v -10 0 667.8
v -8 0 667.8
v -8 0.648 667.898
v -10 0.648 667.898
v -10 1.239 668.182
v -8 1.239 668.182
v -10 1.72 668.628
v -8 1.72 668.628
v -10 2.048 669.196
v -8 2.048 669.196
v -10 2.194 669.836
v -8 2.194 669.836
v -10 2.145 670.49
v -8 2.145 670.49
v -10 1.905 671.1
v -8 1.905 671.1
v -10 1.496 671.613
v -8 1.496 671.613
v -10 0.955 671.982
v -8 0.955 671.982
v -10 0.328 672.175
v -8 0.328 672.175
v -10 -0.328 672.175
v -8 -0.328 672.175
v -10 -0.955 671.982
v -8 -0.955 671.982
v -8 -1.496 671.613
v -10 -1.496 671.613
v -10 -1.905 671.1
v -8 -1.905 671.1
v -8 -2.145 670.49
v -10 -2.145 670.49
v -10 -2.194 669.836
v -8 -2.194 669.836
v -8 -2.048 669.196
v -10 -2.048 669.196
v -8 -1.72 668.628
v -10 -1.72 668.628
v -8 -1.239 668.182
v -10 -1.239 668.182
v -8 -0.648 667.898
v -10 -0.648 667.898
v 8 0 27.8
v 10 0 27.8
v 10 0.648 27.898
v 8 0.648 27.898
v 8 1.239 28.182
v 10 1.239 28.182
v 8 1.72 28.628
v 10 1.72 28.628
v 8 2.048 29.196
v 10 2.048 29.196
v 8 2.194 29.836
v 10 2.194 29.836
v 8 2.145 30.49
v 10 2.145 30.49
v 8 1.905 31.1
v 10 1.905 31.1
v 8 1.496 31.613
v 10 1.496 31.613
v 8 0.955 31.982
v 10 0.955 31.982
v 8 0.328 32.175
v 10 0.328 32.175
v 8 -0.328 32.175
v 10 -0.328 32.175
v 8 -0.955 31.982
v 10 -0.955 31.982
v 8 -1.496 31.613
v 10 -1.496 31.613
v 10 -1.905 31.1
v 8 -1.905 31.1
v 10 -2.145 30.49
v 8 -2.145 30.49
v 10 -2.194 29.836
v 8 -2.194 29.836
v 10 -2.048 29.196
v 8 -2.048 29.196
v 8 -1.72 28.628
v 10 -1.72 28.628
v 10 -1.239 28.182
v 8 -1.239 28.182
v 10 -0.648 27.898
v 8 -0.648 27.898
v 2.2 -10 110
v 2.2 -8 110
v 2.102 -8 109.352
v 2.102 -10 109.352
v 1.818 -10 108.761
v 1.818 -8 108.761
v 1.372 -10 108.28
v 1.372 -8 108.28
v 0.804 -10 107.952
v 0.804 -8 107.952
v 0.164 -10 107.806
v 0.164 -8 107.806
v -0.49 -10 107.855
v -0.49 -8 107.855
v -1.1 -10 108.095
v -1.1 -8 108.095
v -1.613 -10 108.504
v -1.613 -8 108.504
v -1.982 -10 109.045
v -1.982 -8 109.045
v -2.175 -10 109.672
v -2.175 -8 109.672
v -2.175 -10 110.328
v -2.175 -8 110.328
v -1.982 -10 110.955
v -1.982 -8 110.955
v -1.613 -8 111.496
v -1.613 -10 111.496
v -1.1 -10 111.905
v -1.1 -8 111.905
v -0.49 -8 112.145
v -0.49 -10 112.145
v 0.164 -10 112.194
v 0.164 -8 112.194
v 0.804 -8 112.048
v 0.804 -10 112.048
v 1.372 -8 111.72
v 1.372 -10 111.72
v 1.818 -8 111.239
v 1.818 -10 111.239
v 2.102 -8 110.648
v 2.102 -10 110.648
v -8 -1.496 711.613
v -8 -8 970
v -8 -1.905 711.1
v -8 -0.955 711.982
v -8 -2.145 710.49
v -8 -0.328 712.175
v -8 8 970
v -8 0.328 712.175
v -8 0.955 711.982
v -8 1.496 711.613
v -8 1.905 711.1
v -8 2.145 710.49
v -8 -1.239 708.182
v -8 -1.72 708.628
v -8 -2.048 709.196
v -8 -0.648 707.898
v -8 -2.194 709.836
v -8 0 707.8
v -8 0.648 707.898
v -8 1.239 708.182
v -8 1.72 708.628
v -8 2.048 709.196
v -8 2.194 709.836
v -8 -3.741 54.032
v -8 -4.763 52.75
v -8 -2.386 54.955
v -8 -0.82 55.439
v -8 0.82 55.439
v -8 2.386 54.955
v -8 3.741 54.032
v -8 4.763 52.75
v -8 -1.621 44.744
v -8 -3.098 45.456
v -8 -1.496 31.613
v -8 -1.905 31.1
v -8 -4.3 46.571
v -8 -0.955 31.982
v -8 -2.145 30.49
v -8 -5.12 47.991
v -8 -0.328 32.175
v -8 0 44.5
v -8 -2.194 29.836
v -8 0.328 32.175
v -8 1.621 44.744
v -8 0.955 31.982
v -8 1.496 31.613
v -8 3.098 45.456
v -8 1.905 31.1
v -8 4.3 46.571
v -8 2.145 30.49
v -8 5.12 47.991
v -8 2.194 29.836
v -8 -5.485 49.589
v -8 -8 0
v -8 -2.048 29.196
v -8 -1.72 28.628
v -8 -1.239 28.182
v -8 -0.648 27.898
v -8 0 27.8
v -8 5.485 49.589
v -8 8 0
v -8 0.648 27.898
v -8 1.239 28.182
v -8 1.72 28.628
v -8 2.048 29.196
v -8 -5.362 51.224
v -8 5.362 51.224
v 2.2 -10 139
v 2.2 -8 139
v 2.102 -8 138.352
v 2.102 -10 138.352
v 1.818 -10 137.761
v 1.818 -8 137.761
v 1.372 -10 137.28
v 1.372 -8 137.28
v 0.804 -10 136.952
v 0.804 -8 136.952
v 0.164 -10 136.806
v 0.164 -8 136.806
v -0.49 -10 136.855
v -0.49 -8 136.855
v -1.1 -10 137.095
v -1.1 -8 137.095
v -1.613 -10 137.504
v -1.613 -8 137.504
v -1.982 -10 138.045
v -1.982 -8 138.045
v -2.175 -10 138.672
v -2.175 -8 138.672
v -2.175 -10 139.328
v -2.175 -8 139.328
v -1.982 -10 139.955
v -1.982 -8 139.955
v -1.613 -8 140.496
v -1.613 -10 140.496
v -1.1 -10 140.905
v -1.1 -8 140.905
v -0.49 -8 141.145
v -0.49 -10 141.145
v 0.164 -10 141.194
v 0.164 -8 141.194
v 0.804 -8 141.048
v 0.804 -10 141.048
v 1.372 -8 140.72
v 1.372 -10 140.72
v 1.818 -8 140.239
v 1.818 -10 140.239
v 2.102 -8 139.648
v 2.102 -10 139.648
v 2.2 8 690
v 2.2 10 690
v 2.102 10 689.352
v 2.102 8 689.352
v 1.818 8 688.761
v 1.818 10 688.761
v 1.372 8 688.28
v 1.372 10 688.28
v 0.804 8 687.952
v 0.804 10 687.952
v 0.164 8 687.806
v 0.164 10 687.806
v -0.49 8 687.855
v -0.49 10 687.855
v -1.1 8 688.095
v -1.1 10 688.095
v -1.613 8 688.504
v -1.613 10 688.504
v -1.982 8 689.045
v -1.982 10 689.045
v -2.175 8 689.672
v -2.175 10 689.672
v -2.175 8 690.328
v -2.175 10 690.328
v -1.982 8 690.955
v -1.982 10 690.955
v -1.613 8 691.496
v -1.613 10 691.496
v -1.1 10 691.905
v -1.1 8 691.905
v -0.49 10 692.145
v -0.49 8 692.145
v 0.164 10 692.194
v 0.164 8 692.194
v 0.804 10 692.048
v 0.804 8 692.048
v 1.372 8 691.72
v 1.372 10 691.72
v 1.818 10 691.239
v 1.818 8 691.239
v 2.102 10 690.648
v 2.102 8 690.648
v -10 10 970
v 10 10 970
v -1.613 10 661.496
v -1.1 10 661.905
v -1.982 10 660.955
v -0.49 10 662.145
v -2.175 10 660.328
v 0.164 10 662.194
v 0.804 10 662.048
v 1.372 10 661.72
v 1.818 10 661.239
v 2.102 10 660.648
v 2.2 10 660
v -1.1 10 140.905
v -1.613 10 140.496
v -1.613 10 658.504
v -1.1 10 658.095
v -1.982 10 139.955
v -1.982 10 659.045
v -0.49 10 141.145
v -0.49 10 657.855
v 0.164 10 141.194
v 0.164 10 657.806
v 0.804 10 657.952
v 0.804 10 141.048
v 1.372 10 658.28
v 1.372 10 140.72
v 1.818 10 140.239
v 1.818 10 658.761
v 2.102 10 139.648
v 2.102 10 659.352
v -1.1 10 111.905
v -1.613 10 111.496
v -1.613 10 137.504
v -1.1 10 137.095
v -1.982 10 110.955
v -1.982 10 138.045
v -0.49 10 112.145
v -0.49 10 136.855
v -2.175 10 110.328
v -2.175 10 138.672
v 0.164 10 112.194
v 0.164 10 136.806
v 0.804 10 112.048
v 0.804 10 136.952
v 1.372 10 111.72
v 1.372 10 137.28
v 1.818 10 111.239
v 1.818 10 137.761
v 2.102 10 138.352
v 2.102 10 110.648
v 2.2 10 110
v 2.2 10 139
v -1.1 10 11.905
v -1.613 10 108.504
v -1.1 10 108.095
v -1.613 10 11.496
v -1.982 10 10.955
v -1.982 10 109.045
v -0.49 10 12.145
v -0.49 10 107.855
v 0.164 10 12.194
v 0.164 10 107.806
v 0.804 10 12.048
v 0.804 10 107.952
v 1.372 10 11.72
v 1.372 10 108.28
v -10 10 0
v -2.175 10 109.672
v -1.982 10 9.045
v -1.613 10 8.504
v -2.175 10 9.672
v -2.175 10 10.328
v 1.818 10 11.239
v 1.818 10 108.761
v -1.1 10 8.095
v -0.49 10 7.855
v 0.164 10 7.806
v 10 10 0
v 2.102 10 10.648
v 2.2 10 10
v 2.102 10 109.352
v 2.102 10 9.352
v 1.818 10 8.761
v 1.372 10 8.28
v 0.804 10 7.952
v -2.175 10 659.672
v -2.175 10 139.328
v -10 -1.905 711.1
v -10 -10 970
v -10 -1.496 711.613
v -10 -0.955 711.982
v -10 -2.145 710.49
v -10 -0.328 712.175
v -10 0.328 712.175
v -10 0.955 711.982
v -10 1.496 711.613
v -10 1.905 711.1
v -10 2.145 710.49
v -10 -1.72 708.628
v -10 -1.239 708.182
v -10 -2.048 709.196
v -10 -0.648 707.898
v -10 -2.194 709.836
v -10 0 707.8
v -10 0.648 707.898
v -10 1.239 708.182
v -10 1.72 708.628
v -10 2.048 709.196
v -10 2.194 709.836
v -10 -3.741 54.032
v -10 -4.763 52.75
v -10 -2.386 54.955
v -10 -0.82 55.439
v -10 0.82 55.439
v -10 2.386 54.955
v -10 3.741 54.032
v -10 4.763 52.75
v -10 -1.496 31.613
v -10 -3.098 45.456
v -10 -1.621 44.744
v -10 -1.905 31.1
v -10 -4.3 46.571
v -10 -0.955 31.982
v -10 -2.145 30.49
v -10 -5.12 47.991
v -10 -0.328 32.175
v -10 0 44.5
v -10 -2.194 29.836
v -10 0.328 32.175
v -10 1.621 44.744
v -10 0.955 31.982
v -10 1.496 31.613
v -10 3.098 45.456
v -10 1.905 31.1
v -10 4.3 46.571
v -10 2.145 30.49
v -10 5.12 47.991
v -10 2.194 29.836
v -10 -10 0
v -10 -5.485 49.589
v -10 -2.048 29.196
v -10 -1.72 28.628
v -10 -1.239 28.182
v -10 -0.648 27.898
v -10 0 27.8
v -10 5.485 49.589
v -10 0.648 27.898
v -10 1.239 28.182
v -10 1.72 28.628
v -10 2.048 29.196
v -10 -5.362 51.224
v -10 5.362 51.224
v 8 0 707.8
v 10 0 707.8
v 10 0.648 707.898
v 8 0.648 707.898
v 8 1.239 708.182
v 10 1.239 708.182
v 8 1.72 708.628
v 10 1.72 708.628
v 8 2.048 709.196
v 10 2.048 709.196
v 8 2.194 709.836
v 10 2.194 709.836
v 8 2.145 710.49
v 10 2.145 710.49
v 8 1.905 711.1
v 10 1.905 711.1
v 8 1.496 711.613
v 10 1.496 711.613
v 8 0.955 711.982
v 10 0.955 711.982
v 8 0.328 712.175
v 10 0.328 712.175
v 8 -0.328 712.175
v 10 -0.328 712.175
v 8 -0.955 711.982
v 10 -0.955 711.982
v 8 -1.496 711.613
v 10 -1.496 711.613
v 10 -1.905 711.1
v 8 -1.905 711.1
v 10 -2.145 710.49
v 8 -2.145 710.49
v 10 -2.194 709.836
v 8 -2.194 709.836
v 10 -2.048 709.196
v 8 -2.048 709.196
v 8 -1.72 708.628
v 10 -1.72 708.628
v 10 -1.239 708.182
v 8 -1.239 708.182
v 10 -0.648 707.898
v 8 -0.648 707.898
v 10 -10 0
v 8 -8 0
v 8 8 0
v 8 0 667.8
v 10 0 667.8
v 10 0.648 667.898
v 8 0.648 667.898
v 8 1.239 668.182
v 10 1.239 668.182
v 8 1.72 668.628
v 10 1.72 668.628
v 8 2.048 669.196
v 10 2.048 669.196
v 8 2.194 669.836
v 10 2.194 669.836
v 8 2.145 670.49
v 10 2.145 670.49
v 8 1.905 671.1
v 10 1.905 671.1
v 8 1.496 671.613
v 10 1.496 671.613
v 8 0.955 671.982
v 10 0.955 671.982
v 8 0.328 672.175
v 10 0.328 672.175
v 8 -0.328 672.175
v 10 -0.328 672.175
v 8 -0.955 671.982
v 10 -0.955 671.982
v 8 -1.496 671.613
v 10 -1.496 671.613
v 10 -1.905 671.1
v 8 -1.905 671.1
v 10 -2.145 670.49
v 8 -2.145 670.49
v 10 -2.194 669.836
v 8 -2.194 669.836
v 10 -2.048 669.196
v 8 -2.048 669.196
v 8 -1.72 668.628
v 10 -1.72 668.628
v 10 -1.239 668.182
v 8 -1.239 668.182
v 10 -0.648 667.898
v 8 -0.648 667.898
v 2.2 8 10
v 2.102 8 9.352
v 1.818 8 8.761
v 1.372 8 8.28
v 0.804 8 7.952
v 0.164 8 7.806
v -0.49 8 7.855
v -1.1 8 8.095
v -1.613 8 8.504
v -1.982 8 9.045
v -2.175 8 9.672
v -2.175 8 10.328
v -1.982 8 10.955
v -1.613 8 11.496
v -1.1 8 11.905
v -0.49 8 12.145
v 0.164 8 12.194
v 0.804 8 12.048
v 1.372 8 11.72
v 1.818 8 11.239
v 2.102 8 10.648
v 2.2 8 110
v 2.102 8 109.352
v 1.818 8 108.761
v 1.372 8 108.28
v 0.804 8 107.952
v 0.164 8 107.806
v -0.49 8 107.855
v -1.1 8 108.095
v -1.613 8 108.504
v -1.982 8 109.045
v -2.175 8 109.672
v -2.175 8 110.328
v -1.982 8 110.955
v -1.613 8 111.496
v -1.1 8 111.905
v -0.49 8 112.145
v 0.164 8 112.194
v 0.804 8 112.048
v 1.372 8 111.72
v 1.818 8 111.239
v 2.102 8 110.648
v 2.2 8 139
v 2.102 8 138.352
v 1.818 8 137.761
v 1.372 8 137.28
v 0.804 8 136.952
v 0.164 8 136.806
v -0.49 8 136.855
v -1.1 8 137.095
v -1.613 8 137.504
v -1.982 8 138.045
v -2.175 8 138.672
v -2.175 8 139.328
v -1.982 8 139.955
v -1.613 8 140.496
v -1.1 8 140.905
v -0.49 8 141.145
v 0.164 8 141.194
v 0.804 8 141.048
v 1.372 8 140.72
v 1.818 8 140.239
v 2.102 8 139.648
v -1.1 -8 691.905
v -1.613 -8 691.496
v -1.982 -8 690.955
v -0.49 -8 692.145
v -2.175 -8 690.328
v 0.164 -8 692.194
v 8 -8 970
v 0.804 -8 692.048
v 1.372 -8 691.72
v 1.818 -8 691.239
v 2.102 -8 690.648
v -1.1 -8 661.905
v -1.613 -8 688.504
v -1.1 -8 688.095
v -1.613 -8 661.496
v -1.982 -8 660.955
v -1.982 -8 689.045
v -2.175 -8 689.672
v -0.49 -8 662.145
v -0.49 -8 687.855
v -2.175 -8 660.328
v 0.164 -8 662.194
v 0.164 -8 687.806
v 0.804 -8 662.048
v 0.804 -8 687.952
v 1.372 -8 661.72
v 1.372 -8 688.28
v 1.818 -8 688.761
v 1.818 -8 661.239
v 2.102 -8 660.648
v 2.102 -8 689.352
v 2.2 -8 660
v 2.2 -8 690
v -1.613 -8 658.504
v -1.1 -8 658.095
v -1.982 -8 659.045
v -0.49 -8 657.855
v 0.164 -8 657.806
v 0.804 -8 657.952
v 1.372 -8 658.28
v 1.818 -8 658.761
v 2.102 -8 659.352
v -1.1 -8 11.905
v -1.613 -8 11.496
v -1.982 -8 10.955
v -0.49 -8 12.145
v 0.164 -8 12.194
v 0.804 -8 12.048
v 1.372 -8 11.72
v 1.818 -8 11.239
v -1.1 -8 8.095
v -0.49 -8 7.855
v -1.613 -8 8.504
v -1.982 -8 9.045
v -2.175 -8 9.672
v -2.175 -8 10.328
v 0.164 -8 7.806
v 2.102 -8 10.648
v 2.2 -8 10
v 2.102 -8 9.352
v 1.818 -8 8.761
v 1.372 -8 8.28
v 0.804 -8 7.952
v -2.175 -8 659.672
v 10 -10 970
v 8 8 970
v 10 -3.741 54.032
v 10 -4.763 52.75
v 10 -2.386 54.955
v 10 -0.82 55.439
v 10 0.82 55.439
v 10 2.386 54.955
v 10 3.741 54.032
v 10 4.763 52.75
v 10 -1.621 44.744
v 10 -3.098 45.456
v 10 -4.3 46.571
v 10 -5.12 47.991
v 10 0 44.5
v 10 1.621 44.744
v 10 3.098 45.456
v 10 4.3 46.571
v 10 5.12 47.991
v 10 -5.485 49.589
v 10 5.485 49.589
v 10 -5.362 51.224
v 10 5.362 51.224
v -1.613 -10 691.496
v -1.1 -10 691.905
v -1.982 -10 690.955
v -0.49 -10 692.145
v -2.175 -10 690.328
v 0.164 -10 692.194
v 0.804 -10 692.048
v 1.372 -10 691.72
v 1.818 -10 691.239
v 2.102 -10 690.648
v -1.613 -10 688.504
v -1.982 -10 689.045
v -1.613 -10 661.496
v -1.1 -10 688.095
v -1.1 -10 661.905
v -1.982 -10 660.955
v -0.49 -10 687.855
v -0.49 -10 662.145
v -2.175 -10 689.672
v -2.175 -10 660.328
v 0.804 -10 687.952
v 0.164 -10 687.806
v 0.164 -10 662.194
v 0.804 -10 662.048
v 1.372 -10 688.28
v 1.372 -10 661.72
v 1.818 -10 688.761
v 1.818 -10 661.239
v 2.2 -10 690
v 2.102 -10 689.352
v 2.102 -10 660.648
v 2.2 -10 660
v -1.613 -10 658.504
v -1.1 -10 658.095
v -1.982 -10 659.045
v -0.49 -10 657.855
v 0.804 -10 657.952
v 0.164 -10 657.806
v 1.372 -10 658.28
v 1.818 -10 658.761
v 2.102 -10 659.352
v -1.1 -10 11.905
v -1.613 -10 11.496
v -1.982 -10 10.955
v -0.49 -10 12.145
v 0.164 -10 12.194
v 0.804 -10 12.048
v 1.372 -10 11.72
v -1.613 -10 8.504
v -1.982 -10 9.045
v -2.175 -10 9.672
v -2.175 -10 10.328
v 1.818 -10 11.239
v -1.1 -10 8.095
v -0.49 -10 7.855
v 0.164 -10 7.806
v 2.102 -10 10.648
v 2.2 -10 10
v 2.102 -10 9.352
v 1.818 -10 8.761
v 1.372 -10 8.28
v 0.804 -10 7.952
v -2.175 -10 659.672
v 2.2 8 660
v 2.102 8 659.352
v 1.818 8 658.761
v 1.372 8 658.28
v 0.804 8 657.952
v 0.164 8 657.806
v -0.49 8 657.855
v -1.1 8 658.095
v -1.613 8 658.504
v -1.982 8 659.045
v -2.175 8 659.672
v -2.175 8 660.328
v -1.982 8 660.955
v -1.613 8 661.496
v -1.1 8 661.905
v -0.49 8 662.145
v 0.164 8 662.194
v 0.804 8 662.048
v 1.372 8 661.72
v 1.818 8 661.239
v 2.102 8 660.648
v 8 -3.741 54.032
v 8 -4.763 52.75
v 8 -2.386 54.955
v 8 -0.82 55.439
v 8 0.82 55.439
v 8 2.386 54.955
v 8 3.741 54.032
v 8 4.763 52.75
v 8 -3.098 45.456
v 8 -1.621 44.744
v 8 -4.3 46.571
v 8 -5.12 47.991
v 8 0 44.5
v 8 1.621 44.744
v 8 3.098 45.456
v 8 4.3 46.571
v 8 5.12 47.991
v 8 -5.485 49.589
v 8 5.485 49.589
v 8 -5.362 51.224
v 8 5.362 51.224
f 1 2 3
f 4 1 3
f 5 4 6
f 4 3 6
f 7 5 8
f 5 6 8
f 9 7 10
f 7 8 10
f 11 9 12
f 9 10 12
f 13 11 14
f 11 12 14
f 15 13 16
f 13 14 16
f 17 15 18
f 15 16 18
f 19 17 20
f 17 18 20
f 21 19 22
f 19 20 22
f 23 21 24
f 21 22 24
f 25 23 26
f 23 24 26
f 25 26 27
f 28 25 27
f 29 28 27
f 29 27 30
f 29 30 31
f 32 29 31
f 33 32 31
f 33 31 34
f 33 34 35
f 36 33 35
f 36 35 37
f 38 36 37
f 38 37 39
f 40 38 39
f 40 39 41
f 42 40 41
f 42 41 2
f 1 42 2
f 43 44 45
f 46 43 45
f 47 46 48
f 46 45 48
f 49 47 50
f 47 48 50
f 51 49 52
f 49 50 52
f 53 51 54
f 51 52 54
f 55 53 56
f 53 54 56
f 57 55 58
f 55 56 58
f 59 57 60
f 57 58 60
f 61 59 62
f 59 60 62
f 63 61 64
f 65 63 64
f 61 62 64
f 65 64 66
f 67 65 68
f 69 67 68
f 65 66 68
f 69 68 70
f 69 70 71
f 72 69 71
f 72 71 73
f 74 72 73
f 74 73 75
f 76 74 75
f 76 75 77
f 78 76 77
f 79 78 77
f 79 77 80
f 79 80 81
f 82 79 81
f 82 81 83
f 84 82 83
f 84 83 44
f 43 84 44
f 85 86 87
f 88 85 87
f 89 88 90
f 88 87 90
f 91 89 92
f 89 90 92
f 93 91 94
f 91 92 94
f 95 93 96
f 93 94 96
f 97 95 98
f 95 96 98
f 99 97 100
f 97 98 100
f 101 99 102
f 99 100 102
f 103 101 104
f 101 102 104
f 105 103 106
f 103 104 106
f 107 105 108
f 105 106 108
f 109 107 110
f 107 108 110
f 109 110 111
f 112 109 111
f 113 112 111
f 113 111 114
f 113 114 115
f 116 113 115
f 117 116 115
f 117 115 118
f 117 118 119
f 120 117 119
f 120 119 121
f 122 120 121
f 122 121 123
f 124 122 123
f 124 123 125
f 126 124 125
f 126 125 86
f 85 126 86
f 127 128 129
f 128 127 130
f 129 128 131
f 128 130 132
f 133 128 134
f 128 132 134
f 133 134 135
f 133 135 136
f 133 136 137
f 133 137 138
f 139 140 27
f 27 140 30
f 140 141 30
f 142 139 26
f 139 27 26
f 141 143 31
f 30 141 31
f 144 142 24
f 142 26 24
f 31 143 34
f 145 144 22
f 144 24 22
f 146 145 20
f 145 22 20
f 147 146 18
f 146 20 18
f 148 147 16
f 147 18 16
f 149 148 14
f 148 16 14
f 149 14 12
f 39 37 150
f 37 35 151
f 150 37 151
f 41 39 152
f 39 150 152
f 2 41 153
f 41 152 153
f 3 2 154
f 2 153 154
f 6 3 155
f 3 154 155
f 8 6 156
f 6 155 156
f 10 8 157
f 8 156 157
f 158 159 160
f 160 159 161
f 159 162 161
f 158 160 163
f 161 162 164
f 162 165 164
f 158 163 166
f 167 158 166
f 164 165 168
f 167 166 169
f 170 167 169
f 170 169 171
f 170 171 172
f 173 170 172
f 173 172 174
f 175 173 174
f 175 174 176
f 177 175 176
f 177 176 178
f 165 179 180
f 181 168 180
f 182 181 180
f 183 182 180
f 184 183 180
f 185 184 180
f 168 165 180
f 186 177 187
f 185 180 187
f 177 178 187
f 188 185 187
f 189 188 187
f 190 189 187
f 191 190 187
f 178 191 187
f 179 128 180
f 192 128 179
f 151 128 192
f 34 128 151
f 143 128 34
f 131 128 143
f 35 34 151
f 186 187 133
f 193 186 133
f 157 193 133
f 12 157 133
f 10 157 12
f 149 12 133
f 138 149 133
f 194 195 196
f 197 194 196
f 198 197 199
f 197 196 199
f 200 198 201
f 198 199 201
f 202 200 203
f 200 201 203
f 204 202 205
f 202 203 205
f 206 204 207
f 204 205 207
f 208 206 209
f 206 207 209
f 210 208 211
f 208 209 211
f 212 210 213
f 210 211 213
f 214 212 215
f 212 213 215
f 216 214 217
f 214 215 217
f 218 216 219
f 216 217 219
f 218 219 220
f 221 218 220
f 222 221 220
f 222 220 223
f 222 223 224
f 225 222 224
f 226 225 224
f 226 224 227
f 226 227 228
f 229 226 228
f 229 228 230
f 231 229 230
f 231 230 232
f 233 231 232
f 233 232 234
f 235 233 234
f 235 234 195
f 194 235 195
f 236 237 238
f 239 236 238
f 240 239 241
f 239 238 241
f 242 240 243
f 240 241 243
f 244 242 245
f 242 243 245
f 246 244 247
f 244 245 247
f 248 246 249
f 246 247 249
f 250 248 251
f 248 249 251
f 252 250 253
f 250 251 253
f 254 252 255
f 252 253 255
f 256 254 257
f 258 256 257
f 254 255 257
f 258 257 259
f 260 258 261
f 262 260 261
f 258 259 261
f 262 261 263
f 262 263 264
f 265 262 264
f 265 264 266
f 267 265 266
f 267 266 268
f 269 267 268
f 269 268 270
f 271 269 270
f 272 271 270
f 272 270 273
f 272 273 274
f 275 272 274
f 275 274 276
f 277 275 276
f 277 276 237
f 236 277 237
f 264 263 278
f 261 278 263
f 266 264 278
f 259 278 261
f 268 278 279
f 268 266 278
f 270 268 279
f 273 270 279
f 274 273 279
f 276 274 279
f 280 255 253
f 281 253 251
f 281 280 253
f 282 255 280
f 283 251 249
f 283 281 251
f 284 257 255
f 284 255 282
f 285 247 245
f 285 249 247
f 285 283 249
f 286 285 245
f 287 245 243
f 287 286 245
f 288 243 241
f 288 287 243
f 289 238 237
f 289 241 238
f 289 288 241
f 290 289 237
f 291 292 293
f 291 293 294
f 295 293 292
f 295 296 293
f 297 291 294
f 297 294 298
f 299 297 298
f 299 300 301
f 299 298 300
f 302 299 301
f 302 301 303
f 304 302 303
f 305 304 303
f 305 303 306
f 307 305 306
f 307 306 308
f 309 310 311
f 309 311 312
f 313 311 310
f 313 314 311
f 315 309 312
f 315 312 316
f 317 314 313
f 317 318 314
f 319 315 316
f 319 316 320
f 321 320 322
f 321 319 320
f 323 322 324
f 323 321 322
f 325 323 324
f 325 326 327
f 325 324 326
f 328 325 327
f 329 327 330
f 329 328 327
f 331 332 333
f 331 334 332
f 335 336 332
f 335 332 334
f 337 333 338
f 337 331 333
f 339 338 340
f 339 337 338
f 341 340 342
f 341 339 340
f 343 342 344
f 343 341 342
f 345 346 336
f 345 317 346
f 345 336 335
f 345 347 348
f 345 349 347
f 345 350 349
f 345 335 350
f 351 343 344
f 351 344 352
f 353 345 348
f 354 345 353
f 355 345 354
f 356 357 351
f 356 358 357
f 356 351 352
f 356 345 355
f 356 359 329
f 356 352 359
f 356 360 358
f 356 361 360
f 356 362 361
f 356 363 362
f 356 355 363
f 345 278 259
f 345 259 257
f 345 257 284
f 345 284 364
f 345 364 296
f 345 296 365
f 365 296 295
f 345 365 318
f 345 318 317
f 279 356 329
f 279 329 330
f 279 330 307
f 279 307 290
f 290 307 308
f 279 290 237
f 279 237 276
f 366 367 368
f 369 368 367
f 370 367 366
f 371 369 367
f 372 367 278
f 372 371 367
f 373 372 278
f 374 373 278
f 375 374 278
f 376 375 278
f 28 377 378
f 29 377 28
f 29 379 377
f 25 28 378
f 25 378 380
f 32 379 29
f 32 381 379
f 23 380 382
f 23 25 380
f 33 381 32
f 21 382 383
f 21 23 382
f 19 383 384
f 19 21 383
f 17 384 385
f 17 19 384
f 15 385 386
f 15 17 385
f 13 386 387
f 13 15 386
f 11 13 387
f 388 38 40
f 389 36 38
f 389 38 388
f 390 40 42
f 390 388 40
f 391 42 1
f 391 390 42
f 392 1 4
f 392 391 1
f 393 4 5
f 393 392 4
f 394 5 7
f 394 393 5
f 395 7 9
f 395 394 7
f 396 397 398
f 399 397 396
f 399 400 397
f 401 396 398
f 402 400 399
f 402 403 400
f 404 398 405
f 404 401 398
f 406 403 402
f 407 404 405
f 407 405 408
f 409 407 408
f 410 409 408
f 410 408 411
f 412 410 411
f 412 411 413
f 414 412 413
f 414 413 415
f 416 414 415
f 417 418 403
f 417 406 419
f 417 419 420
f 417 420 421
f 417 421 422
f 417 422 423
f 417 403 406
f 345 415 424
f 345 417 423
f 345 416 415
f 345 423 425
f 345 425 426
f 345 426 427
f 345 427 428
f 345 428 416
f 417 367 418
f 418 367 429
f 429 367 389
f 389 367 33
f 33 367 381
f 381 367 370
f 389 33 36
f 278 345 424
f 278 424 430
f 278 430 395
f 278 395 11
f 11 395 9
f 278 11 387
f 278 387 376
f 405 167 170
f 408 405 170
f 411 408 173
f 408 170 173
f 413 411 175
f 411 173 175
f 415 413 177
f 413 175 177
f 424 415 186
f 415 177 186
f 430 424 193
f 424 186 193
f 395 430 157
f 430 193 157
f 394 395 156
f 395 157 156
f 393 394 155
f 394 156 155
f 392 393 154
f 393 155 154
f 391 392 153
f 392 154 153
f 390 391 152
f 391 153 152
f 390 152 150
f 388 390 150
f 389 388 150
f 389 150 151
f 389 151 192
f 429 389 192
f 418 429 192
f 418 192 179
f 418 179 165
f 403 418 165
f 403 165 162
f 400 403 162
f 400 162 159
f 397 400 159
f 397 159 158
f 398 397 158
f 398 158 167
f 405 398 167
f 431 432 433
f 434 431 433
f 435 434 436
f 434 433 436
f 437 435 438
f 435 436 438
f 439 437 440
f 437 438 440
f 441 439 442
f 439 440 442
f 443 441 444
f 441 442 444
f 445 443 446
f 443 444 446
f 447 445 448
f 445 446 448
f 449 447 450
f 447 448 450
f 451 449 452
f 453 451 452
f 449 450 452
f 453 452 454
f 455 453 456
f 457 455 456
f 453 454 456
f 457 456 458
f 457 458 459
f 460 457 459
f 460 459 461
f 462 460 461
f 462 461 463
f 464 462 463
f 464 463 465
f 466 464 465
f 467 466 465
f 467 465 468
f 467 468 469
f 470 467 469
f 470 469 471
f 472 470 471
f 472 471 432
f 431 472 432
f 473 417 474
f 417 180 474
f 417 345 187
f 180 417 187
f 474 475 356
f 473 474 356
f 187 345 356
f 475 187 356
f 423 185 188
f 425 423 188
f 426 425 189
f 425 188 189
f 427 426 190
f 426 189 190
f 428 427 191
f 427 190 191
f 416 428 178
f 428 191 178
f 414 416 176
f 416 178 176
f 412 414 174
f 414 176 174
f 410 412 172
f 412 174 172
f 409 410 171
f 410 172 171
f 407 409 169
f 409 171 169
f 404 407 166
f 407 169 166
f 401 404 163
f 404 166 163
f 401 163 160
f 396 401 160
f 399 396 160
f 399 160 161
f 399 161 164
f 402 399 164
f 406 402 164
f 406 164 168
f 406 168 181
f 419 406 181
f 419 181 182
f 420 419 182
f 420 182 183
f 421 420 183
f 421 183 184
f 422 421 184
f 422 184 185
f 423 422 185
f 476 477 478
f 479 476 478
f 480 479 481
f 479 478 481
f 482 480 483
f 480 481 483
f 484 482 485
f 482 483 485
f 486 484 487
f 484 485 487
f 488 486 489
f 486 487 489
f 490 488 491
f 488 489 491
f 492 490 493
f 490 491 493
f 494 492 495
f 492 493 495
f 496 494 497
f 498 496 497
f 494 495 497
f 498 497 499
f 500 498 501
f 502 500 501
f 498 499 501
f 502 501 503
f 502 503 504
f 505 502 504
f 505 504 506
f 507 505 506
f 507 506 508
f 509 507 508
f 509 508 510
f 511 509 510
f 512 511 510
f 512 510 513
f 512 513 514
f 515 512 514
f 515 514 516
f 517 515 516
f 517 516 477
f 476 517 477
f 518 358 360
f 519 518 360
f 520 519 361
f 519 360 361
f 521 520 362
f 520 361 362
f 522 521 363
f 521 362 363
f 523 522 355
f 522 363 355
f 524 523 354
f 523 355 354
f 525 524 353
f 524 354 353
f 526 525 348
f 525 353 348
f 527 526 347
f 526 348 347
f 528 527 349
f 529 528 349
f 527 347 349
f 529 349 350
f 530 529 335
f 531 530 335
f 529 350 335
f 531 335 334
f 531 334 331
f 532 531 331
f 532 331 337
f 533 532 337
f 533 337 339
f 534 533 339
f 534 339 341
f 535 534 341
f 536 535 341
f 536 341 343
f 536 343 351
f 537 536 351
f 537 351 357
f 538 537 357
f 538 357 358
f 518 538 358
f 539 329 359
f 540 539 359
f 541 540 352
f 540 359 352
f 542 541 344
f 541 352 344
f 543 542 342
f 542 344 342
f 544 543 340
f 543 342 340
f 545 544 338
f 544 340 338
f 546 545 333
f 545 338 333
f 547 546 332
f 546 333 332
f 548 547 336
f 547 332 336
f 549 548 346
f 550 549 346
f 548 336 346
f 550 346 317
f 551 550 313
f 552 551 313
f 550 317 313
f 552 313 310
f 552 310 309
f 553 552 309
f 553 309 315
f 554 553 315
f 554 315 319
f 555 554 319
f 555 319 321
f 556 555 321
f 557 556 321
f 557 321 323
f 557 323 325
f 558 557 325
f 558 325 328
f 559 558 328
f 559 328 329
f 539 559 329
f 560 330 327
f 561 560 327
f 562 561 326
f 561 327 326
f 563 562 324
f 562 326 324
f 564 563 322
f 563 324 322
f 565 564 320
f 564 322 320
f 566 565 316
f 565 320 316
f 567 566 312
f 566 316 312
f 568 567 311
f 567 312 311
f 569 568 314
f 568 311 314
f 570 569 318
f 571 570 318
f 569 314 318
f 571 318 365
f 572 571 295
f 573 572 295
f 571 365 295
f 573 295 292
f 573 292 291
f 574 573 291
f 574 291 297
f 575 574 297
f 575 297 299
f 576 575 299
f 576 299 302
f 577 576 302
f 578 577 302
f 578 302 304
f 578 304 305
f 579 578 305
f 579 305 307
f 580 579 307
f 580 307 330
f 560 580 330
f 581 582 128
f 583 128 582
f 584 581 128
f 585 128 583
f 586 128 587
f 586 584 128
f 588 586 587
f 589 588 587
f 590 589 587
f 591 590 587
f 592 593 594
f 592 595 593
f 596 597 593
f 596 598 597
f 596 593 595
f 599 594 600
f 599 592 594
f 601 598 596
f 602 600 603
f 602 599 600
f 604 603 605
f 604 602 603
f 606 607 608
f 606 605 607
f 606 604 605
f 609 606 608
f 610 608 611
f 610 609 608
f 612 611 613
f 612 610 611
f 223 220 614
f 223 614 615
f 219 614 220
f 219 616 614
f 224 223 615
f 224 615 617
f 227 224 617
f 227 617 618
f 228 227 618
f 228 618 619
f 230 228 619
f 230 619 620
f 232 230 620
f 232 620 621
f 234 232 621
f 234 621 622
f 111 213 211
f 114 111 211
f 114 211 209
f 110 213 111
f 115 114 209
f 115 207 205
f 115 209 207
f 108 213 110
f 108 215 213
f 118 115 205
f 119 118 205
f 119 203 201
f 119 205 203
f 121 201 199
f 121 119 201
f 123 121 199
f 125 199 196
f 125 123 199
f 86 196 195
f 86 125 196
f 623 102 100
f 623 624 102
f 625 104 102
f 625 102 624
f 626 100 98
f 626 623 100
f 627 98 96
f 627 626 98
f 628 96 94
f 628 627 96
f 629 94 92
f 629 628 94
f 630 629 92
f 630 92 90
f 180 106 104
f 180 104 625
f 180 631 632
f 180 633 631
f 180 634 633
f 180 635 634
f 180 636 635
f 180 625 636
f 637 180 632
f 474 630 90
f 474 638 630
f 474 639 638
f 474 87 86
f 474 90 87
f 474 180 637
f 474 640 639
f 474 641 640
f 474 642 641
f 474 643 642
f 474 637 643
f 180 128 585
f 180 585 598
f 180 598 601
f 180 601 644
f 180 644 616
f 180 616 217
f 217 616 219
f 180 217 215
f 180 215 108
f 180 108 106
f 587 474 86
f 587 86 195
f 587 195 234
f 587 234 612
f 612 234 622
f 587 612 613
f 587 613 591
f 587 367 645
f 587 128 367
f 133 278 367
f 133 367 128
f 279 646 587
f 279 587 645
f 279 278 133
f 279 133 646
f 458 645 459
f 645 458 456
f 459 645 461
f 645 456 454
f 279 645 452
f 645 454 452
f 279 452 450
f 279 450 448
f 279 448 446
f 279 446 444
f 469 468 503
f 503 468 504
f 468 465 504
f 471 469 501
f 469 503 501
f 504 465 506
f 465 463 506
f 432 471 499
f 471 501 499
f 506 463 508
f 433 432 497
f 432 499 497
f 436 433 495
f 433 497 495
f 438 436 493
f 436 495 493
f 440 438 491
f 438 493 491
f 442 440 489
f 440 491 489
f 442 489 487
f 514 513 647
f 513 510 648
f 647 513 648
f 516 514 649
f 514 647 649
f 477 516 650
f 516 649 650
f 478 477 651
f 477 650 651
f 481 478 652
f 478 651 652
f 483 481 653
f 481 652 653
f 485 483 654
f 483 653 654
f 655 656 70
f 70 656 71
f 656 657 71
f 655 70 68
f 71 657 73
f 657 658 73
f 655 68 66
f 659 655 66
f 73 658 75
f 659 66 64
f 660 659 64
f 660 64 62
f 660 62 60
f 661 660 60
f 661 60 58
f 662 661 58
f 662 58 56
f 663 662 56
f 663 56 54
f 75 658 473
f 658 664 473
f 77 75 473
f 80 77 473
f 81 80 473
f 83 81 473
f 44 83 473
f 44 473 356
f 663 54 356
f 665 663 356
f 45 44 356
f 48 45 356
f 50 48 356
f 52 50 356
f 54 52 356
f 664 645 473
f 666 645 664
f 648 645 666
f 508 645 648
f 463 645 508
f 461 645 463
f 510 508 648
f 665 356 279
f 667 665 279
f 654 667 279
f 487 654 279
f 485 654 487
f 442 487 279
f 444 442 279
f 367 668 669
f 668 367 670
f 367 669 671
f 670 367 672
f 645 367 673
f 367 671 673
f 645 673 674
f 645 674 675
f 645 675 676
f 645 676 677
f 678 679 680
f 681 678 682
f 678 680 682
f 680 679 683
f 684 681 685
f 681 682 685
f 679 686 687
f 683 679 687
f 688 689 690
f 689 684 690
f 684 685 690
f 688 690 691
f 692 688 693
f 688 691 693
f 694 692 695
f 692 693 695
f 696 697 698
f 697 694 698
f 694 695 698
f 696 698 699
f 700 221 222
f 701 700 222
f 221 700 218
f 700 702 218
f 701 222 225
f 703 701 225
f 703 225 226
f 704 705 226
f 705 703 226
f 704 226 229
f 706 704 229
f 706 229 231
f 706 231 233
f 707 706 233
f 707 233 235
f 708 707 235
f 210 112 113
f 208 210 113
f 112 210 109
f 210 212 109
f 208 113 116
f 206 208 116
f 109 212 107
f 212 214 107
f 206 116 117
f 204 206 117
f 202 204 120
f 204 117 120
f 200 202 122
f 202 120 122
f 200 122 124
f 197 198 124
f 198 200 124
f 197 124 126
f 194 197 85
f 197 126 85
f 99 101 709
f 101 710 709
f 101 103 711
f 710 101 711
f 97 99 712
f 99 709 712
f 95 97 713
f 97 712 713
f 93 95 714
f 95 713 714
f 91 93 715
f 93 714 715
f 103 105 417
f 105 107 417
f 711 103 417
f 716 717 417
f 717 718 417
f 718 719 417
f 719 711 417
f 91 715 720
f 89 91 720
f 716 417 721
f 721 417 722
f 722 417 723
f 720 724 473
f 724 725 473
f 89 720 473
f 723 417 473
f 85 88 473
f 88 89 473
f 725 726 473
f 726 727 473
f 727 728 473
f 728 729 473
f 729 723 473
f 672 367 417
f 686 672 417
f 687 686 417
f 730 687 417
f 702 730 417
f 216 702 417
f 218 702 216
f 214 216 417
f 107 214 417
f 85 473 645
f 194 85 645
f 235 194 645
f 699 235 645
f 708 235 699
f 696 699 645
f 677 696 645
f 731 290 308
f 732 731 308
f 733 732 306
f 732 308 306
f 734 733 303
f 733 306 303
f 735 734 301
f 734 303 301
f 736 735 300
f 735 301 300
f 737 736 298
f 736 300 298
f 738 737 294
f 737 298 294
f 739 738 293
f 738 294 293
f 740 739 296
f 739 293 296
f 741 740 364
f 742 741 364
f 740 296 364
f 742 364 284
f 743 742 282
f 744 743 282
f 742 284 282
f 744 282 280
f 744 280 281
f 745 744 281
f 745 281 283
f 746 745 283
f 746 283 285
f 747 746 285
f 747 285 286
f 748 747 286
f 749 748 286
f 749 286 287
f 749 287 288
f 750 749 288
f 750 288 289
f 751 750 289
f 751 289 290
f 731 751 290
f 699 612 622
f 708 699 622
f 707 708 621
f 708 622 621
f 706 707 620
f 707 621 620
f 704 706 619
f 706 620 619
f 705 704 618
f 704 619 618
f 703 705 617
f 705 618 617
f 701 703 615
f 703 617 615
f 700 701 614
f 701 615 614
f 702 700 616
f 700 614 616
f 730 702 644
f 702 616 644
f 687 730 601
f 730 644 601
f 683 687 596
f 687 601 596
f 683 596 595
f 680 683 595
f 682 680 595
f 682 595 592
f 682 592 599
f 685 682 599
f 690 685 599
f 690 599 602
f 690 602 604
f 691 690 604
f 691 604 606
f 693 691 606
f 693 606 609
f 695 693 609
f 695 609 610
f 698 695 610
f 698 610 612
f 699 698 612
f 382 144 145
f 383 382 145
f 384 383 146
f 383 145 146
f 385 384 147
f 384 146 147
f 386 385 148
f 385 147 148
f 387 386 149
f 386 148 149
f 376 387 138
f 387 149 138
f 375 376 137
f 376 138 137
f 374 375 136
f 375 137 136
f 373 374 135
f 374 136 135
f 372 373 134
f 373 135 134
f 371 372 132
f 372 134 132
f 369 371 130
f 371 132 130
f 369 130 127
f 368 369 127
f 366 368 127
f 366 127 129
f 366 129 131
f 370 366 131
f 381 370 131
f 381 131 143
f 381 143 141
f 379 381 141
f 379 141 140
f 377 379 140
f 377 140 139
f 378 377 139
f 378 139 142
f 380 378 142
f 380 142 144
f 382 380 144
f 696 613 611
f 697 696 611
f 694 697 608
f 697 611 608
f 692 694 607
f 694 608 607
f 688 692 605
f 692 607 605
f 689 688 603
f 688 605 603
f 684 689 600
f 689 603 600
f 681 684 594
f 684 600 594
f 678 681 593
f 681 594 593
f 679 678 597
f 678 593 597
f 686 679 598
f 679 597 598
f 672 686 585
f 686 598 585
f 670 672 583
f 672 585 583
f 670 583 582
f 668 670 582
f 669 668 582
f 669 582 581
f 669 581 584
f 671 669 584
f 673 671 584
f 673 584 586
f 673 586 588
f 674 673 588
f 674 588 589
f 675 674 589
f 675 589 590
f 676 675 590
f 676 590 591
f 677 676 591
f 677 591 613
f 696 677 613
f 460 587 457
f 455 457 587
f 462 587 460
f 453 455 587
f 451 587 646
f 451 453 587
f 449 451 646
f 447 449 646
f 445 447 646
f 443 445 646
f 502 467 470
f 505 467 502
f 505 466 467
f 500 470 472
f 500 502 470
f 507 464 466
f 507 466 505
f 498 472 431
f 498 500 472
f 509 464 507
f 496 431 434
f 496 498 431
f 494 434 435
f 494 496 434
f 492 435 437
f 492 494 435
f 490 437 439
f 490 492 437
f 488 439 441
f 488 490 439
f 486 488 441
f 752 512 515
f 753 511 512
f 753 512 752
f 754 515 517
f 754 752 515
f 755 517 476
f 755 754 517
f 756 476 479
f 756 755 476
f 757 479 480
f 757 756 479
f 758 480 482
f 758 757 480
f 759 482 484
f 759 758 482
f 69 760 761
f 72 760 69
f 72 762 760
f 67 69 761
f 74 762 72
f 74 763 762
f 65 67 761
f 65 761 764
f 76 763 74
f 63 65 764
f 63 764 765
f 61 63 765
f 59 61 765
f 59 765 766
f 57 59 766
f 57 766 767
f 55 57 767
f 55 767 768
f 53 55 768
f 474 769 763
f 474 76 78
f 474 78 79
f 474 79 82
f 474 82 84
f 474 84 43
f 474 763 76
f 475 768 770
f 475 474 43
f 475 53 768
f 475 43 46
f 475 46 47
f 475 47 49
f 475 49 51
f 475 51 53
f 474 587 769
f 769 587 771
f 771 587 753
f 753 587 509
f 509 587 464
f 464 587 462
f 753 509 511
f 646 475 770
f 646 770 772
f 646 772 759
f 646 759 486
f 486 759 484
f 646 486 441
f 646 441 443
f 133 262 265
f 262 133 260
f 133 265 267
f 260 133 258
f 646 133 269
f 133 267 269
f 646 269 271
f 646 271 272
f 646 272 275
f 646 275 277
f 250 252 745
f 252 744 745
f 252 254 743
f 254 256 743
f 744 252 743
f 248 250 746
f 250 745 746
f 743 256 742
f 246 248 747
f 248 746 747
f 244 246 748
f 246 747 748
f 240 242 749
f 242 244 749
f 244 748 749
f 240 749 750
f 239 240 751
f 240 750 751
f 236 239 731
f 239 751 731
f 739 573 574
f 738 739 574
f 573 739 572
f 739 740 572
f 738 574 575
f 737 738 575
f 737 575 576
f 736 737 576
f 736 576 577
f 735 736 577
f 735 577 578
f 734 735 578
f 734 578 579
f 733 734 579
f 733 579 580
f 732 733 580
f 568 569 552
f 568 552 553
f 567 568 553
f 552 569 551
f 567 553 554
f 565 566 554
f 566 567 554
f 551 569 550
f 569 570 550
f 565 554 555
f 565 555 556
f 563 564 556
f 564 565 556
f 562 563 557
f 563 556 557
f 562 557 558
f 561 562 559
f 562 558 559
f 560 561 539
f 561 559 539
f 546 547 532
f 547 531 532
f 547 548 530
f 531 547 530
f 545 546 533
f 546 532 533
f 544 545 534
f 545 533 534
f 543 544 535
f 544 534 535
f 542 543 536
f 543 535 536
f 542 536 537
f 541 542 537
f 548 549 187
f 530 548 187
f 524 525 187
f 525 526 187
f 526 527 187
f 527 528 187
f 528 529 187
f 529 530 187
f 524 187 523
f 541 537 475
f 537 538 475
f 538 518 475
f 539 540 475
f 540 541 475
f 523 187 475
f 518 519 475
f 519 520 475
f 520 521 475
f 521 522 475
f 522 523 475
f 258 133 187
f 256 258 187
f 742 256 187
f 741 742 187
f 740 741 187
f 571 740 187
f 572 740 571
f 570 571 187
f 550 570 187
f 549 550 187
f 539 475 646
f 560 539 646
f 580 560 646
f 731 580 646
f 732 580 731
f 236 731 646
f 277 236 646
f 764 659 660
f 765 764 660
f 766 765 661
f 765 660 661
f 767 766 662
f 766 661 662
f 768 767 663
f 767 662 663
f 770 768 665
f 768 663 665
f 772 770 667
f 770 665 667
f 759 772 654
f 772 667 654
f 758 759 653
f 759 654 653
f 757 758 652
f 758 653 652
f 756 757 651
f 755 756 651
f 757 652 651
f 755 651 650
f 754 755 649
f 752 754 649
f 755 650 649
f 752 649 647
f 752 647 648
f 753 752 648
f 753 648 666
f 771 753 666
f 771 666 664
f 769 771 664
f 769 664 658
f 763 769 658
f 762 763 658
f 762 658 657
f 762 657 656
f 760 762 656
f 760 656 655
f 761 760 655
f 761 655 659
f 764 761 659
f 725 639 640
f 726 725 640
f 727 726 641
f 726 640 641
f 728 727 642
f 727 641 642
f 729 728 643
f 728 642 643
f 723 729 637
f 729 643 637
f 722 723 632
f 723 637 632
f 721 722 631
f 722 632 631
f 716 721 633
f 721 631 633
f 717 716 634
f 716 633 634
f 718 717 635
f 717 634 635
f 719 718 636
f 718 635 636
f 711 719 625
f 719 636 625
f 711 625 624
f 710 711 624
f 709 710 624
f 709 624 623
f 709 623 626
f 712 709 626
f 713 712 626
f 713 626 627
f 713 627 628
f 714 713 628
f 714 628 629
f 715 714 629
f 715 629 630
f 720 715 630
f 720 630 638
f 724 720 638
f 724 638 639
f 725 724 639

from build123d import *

# Parameters (mm, degrees)
SKETCH_1_W          = 20
SKETCH_1_H          = 20
SKETCH_1_W_2        = 16
SKETCH_1_H_2        = 16
EXTRUDE_1_DEPTH     = 970
SKETCH_2_R          = 2.2
SKETCH_2_R_2        = 5.5
CUT_EXTRUDE_1_DEPTH = 970
SKETCH_3_R          = 2.2
CUT_EXTRUDE_2_DEPTH = 970
SKETCH_5_R          = 2.2
CUT_EXTRUDE_4_DEPTH = 30


with BuildPart() as part:
    # ｽｹｯﾁ1 → ﾎﾞｽ - 押し出し1 (new body)
    with BuildSketch(Plane.XY):
        Rectangle(SKETCH_1_W, SKETCH_1_H)
        Rectangle(SKETCH_1_W_2, SKETCH_1_H_2, mode=Mode.SUBTRACT)
    extrude(amount=EXTRUDE_1_DEPTH)

    # ｽｹｯﾁ2 → ｶｯﾄ - 押し出し1 (cut)
    with BuildSketch(Plane(origin=(10, 0, 0), x_dir=(0, 0, -1), z_dir=(1, 0, 0))):
        with Locations((-710, 0)):
            Circle(SKETCH_2_R)
        with Locations((-670, 0)):
            Circle(SKETCH_2_R)
        with Locations((-50, 0)):
            Circle(SKETCH_2_R_2)
        with Locations((-30, 0)):
            Circle(SKETCH_2_R)
    extrude(amount=-CUT_EXTRUDE_1_DEPTH, mode=Mode.SUBTRACT)

    # ｽｹｯﾁ3 → ｶｯﾄ - 押し出し2 (cut)
    with BuildSketch(Plane(origin=(0, 10, 0), x_dir=(1, 0, 0), z_dir=(0, 1, 0))):
        with Locations((0, -690)):
            Circle(SKETCH_3_R)
        with Locations((0, -660)):
            Circle(SKETCH_3_R)
        with Locations((0, -10)):
            Circle(SKETCH_3_R)
    extrude(amount=-CUT_EXTRUDE_2_DEPTH, mode=Mode.SUBTRACT)

    # ｽｹｯﾁ5 → ｶｯﾄ - 押し出し4 (cut)
    with BuildSketch(Plane(origin=(0, 10, 0), x_dir=(1, 0, 0), z_dir=(0, 1, 0))):
        with Locations((0, -110)):
            Circle(SKETCH_5_R)
        with Locations((0, -139)):
            Circle(SKETCH_5_R)
    extrude(amount=-CUT_EXTRUDE_4_DEPTH, mode=Mode.SUBTRACT)


solid = part.part
